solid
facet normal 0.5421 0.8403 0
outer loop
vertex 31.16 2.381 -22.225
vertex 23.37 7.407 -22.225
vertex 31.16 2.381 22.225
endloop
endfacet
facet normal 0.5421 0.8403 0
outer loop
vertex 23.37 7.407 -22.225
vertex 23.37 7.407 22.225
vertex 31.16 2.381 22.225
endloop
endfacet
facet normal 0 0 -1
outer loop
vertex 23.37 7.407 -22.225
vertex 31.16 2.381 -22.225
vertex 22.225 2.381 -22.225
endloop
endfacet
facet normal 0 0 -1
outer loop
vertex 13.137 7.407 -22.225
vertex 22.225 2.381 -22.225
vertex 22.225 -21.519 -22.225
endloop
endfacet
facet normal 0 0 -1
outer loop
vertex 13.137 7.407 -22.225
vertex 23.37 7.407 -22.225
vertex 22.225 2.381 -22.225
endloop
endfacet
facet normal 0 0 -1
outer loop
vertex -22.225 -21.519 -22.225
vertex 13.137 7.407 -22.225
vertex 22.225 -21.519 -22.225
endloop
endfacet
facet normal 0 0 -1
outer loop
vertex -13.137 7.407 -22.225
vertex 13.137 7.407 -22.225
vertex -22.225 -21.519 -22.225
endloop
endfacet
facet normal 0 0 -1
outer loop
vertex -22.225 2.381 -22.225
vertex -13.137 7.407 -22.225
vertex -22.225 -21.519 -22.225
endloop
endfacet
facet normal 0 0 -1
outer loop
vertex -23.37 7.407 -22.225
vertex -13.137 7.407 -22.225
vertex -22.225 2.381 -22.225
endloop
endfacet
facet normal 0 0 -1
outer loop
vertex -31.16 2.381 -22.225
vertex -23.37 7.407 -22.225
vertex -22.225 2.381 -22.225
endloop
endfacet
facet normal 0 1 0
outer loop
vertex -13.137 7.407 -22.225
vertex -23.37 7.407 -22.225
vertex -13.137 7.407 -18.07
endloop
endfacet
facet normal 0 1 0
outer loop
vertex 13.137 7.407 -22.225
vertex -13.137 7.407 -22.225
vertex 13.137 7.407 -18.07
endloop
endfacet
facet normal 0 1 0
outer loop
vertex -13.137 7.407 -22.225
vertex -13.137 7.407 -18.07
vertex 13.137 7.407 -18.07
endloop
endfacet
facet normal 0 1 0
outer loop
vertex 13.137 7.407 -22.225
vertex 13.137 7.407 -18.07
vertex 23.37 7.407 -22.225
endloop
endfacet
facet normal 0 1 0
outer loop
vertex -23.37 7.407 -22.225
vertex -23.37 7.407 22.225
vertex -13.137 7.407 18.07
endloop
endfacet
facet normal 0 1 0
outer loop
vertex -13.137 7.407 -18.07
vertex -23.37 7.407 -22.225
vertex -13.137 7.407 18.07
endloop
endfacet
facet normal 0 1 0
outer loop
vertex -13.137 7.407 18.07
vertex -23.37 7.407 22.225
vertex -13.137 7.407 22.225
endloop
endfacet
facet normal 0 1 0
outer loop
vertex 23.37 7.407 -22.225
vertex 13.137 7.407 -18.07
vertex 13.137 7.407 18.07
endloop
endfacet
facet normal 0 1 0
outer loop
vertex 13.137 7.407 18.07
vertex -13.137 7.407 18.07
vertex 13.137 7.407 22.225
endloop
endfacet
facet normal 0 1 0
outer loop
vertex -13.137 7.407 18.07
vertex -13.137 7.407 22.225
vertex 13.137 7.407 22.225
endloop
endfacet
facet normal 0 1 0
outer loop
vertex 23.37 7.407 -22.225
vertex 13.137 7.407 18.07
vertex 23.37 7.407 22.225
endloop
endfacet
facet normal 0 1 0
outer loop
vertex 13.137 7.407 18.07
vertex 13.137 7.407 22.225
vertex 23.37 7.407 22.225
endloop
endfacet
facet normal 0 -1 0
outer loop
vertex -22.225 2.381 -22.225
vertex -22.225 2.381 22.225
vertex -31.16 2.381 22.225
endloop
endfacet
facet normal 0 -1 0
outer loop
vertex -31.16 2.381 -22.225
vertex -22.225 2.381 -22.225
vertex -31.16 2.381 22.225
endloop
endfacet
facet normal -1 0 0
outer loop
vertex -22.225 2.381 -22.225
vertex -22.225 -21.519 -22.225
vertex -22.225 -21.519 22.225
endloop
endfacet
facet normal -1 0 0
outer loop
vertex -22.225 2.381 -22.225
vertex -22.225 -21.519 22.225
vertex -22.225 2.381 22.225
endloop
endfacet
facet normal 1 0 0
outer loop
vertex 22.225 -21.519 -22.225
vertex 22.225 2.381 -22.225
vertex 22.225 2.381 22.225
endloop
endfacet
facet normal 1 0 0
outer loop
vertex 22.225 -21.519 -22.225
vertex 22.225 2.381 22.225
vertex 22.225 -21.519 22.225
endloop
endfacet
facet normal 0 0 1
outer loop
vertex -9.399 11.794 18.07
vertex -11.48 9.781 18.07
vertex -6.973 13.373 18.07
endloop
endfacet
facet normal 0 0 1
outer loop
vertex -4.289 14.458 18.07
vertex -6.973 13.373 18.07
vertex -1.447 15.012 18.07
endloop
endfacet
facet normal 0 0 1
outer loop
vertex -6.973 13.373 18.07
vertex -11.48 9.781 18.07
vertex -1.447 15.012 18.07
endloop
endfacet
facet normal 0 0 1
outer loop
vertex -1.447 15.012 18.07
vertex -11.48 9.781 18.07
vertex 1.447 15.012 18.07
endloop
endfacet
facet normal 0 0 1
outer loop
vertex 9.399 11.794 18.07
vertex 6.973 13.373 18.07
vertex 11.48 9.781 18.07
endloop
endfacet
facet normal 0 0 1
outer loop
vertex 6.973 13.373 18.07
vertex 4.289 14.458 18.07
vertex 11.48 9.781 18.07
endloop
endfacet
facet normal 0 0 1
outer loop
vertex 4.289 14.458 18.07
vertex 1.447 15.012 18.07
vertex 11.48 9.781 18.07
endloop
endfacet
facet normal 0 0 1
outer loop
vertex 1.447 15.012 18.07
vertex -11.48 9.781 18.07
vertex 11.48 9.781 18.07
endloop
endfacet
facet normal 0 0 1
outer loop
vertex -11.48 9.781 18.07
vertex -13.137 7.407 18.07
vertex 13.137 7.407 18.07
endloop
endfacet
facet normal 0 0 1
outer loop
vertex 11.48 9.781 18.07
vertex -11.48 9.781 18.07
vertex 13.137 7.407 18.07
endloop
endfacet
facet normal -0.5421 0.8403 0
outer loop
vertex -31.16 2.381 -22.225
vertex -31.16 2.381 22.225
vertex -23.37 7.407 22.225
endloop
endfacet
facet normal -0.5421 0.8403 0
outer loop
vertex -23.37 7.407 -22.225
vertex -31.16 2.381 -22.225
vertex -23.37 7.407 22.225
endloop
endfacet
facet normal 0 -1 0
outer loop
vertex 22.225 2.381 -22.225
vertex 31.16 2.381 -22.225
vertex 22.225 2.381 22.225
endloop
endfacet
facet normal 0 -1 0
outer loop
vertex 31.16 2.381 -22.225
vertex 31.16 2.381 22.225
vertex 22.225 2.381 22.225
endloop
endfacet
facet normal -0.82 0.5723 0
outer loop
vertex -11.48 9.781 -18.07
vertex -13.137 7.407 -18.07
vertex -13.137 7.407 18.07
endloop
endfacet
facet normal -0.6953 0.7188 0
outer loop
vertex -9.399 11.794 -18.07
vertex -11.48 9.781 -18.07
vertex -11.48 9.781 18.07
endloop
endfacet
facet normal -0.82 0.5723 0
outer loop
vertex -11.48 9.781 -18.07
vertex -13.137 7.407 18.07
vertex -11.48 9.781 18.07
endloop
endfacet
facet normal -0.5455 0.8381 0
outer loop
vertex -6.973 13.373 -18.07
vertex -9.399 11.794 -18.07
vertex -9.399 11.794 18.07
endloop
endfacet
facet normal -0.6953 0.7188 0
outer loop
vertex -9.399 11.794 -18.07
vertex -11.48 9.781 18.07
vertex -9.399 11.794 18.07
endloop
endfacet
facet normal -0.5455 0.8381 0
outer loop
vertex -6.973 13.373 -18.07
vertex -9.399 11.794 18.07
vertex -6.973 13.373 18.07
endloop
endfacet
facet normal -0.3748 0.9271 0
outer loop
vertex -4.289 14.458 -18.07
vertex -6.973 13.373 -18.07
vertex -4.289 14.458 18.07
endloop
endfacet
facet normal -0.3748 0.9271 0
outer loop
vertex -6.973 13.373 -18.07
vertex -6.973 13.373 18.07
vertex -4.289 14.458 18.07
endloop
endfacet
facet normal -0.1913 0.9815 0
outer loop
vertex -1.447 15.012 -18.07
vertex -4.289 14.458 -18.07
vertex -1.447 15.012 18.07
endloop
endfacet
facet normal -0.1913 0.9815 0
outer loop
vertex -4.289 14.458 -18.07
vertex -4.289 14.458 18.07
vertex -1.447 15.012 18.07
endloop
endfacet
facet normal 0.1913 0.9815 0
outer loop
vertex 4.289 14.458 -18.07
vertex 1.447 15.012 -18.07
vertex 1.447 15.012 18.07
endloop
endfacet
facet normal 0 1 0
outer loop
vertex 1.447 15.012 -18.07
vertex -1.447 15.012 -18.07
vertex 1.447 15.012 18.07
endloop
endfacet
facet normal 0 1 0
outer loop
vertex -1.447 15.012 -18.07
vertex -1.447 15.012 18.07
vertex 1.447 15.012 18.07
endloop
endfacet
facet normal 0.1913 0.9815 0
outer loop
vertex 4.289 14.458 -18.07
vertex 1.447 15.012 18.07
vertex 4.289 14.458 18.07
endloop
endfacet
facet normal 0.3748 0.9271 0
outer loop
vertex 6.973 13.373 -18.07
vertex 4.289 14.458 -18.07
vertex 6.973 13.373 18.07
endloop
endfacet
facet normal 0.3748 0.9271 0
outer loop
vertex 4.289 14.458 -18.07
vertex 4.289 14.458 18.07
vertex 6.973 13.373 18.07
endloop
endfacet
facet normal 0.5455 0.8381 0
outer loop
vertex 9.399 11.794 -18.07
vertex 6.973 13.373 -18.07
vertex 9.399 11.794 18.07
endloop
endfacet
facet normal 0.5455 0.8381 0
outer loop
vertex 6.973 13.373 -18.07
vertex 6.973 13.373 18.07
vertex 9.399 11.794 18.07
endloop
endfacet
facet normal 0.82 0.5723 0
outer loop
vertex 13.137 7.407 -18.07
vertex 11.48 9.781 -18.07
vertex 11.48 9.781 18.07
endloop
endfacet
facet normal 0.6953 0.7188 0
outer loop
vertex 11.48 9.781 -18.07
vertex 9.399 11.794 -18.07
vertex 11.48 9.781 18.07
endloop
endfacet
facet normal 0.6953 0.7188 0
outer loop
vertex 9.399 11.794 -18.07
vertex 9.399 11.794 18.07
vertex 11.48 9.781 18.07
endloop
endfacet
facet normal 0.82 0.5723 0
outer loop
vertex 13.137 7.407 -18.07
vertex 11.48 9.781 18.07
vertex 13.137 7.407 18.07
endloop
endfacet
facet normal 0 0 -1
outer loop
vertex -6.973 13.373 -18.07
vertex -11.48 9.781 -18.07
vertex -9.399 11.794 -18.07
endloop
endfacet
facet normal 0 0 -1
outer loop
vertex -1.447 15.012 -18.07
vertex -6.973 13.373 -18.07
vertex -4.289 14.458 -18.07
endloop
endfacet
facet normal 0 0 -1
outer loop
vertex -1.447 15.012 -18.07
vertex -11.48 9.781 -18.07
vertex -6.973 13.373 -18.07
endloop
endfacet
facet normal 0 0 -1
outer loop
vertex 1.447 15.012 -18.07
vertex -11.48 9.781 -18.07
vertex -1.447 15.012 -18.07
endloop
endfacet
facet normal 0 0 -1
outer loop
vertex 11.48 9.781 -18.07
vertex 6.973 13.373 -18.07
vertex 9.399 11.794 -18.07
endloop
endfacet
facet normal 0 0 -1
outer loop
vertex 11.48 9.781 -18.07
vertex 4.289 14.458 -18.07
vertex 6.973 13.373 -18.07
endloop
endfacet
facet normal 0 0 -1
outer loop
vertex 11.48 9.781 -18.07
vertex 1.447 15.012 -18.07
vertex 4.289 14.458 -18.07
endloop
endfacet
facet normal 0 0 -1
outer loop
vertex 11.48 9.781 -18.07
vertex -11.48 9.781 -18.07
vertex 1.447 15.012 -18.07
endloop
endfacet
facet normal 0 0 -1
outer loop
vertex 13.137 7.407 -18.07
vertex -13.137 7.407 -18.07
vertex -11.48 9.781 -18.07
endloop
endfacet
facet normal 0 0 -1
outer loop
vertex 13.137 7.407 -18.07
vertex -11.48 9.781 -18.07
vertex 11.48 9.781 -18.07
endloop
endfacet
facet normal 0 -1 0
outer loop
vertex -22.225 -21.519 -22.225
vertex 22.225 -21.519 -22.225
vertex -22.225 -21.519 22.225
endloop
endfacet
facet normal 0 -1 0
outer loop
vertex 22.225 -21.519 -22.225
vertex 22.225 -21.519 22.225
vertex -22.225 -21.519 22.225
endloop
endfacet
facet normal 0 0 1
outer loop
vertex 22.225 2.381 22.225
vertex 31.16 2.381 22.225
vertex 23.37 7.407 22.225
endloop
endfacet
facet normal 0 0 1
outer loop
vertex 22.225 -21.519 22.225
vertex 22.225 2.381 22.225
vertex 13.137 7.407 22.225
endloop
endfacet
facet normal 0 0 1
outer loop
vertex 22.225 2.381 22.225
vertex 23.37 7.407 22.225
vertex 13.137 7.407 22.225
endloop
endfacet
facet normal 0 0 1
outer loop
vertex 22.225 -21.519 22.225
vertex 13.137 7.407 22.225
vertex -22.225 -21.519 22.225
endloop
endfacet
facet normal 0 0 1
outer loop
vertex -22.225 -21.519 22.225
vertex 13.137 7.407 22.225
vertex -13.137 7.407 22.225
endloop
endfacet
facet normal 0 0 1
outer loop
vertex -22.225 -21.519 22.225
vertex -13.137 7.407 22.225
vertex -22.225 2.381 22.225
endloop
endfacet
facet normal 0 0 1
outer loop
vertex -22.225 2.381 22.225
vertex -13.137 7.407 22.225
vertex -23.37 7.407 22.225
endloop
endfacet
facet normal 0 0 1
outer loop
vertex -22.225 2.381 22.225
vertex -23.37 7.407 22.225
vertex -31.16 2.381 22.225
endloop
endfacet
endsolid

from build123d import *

# Parameters (mm, degrees)
BOSS_EXTRUDE1_DEPTH = 22.225
SKETCH2_W           = 26.27393882
SKETCH2_H           = 4.154599903
CUT_EXTRUDE1_DEPTH  = 44.45


with BuildPart() as part:
    # Sketch1 → Boss-Extrude1 (new body, symmetric)
    with BuildSketch(Plane.XY):
        with BuildLine():
            Line((-23.369890455, 7.407032893), (-13.13696941, 7.407032893))
            ThreePointArc((-13.13696941, 7.407032893), (0, 15.08125), (13.13696941, 7.407032893))
            Line((13.13696941, 7.407032893), (23.369890455, 7.407032893))
            Line((23.369890455, 7.407032893), (31.15985394, 2.38125))
            Line((31.15985394, 2.38125), (22.225, 2.38125))
            Line((22.225, 2.38125), (22.225, -21.51875))
            Line((22.225, -21.51875), (-22.225, -21.51875))
            Line((-22.225, -21.51875), (-22.225, 2.38125))
            Line((-22.225, 2.38125), (-31.15985394, 2.38125))
            Line((-31.15985394, 2.38125), (-23.369890455, 7.407032893))
        make_face()
    extrude(amount=BOSS_EXTRUDE1_DEPTH, both=True)

    # Sketch2 → Cut-Extrude1 (cut)
    with BuildSketch(Plane(origin=(0, 7.407032893, 0), x_dir=(1, 0, 0), z_dir=(0, 1, 0))):
        with Locations((0, 20.147700048)):
            Rectangle(SKETCH2_W, SKETCH2_H)
        with Locations((0, -20.147700048)):
            Rectangle(SKETCH2_W, SKETCH2_H)
    extrude(amount=CUT_EXTRUDE1_DEPTH, mode=Mode.SUBTRACT)


solid = part.part
